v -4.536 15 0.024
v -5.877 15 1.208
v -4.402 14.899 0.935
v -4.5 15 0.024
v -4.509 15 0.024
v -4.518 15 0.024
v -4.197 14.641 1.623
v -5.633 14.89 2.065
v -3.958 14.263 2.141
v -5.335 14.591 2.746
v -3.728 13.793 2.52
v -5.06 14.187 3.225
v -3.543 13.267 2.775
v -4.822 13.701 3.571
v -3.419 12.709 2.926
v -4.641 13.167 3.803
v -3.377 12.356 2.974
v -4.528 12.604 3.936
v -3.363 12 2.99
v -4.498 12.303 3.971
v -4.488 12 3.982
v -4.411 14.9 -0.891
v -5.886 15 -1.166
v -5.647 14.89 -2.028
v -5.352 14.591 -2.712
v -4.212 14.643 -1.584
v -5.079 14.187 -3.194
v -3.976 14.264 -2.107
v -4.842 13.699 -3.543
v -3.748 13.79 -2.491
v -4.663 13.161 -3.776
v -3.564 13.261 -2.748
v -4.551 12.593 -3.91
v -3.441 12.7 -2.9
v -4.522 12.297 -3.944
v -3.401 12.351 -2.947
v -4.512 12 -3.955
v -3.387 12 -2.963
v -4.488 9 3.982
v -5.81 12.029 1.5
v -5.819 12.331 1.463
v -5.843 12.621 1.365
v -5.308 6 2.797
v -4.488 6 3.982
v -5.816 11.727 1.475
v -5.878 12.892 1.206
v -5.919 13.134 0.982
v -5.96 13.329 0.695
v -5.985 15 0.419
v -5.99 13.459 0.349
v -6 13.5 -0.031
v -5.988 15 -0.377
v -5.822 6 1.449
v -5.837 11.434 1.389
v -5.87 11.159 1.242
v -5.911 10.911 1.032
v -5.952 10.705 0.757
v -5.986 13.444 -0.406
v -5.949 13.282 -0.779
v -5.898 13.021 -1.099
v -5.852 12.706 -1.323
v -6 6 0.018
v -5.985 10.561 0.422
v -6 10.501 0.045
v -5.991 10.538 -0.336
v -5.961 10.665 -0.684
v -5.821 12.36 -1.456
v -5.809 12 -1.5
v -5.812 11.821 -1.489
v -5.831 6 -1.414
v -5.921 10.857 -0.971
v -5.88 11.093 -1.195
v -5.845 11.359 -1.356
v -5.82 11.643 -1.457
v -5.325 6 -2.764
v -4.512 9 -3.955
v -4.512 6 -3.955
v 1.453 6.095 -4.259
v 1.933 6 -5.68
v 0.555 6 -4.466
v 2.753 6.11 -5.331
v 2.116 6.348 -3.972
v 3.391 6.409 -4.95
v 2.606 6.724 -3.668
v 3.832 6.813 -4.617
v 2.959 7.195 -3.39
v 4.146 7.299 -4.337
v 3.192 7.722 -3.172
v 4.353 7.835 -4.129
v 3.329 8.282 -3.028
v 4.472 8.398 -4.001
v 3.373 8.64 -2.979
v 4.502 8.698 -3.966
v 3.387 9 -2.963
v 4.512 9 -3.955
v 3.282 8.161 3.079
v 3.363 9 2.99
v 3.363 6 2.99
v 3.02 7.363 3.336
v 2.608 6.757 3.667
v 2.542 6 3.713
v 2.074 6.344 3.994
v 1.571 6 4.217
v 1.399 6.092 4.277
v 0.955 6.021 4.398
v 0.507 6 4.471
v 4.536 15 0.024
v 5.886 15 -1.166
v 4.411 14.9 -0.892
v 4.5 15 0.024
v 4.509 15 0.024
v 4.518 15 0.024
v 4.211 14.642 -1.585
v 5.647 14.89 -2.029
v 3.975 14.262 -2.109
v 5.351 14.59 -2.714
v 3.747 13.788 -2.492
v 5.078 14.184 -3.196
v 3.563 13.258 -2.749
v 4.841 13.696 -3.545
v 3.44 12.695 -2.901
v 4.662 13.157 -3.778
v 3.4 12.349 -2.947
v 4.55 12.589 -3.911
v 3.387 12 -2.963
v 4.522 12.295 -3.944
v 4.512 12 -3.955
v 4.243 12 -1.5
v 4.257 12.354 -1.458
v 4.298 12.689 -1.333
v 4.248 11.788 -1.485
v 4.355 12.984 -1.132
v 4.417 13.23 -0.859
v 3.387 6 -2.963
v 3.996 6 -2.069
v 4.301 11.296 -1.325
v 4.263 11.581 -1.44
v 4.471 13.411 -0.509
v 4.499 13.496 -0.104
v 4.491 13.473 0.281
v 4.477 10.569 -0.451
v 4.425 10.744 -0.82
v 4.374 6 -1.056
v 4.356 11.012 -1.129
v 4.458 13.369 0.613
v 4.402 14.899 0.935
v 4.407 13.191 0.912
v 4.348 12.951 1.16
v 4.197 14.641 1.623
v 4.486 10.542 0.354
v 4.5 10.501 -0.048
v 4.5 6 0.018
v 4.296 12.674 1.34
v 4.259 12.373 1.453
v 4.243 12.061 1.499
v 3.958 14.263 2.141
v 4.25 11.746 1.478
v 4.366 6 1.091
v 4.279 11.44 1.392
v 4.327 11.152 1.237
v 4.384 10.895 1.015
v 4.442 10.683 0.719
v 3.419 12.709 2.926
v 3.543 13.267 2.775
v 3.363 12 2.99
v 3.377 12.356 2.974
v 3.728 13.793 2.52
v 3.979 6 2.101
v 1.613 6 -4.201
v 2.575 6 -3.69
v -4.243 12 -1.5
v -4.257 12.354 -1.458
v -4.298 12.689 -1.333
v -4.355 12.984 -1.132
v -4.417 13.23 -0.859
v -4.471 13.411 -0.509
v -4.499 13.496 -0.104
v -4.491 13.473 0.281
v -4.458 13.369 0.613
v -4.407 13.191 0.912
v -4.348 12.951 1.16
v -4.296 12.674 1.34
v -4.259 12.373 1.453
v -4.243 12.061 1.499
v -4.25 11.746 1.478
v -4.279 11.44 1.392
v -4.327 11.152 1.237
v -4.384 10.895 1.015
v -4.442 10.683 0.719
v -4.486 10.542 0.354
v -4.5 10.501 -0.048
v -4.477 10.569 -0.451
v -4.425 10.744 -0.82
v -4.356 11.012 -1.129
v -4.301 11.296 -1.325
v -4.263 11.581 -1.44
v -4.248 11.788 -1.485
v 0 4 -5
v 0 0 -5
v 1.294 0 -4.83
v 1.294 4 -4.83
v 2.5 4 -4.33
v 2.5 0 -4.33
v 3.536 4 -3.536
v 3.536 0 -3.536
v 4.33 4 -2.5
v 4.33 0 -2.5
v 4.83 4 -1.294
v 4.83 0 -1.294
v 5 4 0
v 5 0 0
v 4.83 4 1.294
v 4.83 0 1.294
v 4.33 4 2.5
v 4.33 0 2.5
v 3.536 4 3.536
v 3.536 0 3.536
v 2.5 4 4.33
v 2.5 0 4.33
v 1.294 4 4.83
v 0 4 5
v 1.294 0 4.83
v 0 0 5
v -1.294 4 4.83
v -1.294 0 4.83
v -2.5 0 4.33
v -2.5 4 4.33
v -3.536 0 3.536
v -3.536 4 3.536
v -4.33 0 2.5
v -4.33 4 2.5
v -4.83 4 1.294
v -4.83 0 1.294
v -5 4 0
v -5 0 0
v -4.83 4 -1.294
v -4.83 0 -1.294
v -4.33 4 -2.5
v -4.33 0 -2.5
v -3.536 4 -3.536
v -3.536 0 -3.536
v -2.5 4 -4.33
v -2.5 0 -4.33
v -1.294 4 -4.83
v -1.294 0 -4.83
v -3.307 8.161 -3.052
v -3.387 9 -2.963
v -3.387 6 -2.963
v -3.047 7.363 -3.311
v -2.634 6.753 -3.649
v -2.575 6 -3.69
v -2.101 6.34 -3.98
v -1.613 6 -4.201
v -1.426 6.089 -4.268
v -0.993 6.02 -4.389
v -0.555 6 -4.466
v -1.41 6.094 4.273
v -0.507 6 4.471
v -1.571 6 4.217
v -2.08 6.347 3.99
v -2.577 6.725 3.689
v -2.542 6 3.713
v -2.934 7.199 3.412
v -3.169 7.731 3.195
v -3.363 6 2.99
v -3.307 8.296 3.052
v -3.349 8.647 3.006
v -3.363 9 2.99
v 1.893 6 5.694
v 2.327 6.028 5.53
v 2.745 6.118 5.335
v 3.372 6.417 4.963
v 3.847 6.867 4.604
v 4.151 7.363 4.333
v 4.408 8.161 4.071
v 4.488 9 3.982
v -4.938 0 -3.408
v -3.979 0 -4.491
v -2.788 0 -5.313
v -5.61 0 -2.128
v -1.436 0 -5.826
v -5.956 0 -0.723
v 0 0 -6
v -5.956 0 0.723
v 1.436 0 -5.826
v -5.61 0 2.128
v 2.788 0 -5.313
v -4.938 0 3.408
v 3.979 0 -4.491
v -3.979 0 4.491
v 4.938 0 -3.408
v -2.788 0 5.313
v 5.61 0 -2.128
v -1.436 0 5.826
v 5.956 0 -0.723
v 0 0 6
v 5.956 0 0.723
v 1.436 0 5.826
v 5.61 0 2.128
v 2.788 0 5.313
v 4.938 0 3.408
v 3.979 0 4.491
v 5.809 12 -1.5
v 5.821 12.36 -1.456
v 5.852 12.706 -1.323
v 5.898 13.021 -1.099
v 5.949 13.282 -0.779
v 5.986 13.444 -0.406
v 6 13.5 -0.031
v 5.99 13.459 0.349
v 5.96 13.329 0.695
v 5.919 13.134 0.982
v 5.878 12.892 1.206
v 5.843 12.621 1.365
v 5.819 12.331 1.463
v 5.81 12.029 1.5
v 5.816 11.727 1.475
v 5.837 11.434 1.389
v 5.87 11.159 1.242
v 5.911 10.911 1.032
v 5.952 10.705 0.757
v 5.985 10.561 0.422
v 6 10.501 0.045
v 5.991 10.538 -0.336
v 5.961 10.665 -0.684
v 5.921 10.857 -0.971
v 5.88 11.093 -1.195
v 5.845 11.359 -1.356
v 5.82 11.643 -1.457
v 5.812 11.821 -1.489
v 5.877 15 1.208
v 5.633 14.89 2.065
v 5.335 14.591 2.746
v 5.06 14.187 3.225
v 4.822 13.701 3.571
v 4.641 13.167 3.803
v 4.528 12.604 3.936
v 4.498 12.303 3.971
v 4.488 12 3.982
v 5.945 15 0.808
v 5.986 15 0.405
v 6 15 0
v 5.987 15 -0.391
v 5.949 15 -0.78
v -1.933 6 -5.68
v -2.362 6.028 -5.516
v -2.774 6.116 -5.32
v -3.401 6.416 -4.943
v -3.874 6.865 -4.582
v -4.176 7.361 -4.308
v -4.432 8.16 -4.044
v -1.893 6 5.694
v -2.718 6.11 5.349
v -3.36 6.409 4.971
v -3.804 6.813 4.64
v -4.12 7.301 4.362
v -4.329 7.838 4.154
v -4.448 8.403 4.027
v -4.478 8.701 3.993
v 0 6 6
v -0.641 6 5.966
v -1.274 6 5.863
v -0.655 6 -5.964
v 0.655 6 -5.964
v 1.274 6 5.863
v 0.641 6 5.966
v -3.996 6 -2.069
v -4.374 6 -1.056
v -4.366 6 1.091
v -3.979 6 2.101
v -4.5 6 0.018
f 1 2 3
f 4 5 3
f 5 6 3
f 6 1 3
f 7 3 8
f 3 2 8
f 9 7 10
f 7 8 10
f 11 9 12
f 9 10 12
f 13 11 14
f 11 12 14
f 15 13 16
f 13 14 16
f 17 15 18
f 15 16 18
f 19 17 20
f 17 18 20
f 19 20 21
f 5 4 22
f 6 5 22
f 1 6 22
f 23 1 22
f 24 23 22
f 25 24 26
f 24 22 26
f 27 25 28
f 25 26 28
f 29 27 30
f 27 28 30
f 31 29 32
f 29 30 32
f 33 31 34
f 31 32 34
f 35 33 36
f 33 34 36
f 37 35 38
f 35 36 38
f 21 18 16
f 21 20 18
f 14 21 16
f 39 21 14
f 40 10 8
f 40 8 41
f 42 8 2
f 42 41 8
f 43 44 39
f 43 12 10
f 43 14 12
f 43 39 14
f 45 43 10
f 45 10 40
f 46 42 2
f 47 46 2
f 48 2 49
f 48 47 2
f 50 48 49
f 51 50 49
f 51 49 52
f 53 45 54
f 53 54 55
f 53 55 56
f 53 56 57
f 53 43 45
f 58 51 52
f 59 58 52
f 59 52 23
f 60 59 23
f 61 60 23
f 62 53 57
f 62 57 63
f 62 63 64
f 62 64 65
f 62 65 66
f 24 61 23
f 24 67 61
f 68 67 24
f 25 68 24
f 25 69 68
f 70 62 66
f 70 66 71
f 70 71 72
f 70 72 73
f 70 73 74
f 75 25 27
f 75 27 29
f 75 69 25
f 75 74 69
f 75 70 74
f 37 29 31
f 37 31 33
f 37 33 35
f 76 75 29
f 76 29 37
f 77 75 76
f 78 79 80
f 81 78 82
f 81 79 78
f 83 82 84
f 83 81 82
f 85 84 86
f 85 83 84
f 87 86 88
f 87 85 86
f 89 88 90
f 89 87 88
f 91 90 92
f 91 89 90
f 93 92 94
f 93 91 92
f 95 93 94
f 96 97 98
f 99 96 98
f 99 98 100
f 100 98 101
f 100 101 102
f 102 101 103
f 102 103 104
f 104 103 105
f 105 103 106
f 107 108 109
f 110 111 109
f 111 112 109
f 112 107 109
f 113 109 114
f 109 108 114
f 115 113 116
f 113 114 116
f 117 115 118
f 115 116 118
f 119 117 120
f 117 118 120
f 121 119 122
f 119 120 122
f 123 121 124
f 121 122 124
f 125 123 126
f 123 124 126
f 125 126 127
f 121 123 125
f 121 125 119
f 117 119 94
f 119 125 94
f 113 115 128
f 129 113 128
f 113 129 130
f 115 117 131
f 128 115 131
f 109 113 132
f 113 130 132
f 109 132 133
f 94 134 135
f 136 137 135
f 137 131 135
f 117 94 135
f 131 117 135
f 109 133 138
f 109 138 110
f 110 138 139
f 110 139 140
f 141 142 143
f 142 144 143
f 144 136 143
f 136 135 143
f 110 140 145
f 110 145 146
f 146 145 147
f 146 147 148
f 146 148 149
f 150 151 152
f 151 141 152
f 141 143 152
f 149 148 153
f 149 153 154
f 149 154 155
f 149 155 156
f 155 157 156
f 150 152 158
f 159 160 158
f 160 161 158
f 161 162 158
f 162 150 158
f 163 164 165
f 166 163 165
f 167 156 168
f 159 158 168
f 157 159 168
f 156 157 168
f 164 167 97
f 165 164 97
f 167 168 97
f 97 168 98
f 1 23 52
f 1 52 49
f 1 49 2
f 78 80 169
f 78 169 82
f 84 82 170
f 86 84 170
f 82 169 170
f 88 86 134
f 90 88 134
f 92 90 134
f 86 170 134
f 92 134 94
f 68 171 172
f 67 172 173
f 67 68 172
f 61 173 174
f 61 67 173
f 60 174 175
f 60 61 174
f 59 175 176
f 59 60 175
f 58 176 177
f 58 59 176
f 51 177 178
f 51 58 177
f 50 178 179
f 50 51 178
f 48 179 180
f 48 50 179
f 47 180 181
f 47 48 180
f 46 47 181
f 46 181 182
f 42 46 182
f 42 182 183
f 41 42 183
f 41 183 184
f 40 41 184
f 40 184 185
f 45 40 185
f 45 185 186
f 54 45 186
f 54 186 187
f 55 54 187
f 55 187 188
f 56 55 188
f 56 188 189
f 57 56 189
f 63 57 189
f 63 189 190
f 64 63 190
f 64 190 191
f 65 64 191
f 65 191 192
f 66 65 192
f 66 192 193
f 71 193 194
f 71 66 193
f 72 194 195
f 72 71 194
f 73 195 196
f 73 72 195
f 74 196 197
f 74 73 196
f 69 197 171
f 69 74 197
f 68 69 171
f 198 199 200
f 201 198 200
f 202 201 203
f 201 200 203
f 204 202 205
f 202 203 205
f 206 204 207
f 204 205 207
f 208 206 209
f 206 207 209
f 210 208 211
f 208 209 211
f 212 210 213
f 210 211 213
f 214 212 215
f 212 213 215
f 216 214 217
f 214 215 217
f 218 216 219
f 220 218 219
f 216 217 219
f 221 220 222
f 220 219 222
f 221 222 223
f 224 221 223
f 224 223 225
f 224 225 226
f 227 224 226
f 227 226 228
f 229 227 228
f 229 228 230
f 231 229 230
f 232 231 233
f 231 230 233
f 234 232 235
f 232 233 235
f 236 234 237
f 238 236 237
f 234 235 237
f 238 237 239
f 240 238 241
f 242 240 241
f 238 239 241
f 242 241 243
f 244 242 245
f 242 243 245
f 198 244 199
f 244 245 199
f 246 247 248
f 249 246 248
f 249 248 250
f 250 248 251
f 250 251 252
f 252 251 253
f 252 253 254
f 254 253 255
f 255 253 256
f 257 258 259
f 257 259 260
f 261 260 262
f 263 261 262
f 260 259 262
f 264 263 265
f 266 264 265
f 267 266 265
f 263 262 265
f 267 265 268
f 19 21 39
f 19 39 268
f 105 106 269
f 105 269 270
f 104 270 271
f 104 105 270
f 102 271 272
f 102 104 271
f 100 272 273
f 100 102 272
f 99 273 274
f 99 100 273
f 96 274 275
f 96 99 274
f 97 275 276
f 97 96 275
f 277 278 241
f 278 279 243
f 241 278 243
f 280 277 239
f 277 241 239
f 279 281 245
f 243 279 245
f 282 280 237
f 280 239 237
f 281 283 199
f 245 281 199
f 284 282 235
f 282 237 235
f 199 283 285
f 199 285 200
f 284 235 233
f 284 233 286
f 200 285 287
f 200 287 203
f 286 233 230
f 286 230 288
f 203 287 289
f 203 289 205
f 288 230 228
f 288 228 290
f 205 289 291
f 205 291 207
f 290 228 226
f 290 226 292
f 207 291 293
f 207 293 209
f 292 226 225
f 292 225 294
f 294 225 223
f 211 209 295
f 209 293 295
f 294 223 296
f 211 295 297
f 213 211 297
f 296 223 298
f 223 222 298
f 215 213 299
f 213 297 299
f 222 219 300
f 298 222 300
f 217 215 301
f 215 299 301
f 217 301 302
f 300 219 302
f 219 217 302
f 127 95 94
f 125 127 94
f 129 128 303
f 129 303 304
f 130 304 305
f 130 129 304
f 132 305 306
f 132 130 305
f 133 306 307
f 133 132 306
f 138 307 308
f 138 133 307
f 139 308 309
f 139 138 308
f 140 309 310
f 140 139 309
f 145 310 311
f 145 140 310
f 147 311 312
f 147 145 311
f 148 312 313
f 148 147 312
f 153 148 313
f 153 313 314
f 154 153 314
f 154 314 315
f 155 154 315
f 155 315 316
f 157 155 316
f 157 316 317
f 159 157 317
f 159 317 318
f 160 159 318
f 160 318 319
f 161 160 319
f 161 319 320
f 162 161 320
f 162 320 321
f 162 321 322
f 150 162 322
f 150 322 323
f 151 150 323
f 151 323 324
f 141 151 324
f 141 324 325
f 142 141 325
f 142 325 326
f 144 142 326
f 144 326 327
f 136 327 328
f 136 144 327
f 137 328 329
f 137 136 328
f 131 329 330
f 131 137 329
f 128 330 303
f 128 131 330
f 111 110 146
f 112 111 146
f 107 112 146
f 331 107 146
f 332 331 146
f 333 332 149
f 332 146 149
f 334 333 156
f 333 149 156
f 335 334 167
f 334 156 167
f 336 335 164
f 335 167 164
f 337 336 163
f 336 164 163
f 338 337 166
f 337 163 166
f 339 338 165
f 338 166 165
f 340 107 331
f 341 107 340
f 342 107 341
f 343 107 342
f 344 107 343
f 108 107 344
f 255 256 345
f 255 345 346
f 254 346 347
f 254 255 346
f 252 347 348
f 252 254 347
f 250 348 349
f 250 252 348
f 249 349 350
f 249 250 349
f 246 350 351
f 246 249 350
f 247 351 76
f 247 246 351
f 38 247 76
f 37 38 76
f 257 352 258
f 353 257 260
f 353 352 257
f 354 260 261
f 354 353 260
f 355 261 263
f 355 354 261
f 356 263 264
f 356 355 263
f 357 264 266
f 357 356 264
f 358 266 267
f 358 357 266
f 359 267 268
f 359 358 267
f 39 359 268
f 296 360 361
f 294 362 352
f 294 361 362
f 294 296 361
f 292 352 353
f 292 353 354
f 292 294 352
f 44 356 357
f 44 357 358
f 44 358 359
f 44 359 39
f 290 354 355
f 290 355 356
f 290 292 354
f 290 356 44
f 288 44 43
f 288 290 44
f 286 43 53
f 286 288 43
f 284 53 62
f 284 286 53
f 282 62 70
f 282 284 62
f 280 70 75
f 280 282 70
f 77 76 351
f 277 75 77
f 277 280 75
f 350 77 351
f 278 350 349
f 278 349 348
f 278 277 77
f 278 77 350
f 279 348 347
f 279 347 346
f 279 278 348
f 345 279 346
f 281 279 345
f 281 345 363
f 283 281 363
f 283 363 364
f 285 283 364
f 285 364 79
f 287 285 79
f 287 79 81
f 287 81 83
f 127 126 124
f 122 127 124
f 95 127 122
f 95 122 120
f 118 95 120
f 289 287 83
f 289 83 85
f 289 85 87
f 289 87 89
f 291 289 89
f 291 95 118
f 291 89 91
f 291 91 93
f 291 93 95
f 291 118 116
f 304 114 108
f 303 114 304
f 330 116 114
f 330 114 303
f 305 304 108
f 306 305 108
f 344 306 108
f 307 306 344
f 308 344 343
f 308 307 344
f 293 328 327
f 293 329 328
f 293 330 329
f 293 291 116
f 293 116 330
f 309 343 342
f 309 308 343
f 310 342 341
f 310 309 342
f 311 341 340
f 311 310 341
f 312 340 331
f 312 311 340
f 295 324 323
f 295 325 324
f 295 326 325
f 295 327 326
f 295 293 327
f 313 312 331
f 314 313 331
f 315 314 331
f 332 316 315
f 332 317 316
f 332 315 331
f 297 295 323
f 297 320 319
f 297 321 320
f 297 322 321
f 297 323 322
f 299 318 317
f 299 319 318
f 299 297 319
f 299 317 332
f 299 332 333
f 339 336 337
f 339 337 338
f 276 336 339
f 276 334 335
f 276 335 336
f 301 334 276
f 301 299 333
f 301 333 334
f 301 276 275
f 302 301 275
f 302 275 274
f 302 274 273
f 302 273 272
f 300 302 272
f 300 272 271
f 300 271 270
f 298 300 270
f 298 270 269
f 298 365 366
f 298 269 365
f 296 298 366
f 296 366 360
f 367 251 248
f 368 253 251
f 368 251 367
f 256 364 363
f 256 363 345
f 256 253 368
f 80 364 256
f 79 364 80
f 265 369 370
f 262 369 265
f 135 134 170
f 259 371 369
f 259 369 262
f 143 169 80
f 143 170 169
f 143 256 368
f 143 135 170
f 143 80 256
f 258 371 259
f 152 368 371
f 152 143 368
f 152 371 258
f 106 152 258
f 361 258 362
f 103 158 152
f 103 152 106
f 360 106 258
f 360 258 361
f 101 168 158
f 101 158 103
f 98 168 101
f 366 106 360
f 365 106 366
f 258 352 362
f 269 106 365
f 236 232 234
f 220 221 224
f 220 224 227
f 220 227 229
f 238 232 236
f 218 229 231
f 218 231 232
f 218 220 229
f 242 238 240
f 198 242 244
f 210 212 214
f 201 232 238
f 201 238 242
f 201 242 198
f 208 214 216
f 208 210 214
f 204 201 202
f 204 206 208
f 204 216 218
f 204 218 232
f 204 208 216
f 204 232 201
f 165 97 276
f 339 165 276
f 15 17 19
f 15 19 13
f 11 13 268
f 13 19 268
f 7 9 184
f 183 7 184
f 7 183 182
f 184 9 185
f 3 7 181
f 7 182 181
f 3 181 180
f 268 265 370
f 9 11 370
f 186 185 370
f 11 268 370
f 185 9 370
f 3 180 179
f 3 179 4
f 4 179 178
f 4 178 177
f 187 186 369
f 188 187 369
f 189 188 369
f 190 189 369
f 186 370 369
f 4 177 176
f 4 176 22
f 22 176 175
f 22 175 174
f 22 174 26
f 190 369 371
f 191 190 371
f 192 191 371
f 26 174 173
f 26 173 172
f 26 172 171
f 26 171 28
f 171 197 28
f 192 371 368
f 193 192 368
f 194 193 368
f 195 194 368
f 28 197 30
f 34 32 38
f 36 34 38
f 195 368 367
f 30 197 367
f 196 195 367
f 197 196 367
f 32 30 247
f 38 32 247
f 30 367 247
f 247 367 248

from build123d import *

# Parameters (mm, degrees)
SKETCH1_R               = 6
BOSS_EXTRUDE1_DEPTH     = 6
BOSS_EXTRUDE2_DEPTH     = 9
FILLET1_R               = 3
FILLET2_R               = 3
CUT_EXTRUDE2_DEPTH      = 18.233688096
CUT_EXTRUDE2_DEPTH_BACK = 18.233688096
SKETCH4_R               = 1.5
SKETCH5_R               = 5
CUT_EXTRUDE3_DEPTH      = 4


with BuildPart() as part:
    # Sketch1 → Boss-Extrude1 (new body)
    with BuildSketch(Plane(origin=(0, 0, 0), x_dir=(1, 0, 0), z_dir=(0, 1, 0))):
        with Locations(Location((0, 0, 0), (0, 0, 270))):
            Circle(SKETCH1_R)
    extrude(amount=BOSS_EXTRUDE1_DEPTH)

    # Sketch3 → Boss-Extrude2 (add)
    with BuildSketch(Plane(origin=(0, 6, 0), x_dir=(1, 0, 0), z_dir=(0, 1, 0))):
        with BuildLine():
            ThreePointArc((-4.512030676, 3.954943638), (-5.999972336, -0.01822004), (-4.487927828, -3.982273699))
            Line((-4.487927828, -3.982273699), (-3.362920912, -2.990110858))
            ThreePointArc((-3.362920912, -2.990110858), (-4.499963114, -0.01822004), (-3.38702376, 2.962780797))
            Line((-3.38702376, 2.962780797), (-4.512030676, 3.954943638))
        make_face()
        with BuildLine():
            Line((3.362920912, -2.990110858), (4.487927828, -3.982273699))
            ThreePointArc((4.487927828, -3.982273699), (5.609258729, -2.129839552), (6, 0))
            ThreePointArc((6, 0), (5.615700493, 2.112796245), (4.512030676, 3.954943638))
            Line((4.512030676, 3.954943638), (3.38702376, 2.962780797))
            ThreePointArc((3.38702376, 2.962780797), (4.499963114, -0.01822004), (3.362920912, -2.990110858))
        make_face()
    extrude(amount=BOSS_EXTRUDE2_DEPTH)

    # Fillet1
    # the kernel refuses this fillet: 3 mm, written as the material it takes off along each edge
    with BuildSketch(Plane(origin=(-2.262079088, 15, -1.970672851), x_dir=(0, -1, 0), z_dir=(0.7499999999999997, 0, 0.661437827766148)), Plane(origin=(10.137030676, 15, -8.915727346), x_dir=(0, -1, 0), z_dir=(-0.7499999999999997, 0, 0.661437827766148)), Plane(origin=(2.23797624, 15, 1.998002911), x_dir=(0, -1, 0), z_dir=(-0.7499999999999997, 0, -0.661437827766148)), Plane(origin=(-10.112927828, 15, 8.943057407), x_dir=(0, -1, 0), z_dir=(0.7499999999999997, 0, -0.661437827766148))) as fillet1_piece_1:
        with BuildLine():
            CenterArc((FILLET1_R, FILLET1_R), FILLET1_R, 180, 90)
            Line((0, FILLET1_R), (0, 0))
            Line((0, 0), (FILLET1_R, 0))
        make_face()
    extrude(amount=16.500009221, mode=Mode.SUBTRACT)

    # Fillet2
    # the kernel refuses this fillet: 3 mm, written as the material it adds along each edge
    with BuildSketch(Plane(origin=(-2.262079088, 6, -1.970672851), x_dir=(-0.661437827766148, 0, 0.7499999999999997), z_dir=(0.7499999999999997, 0, 0.661437827766148))) as fillet2_piece_1_section:
        with BuildLine():
            CenterArc((FILLET2_R, -FILLET2_R), FILLET2_R, 90, 90)
            Line((0, -FILLET2_R), (0, 0))
            Line((0, 0), (FILLET2_R, 0))
        make_face()
    fillet2_piece_1 = extrude(amount=16.500009221, mode=Mode.PRIVATE)
    fillet2_piece_1 = fillet2_piece_1 & Plane(origin=(0, 6.66993204, 0), x_dir=(0, 0, 1), z_dir=(0, -1, 0)) * Cylinder(6, 46, mode=Mode.PRIVATE)
    fillet2_piece_1 = fillet2_piece_1 - Plane(origin=(0, 6.66993204, 0), x_dir=(0.7526719465807102, 0, -0.6583957326945586), z_dir=(0, -1, 0)) * Cylinder(4.5, 46, mode=Mode.PRIVATE)
    add(fillet2_piece_1)
    with BuildSketch(Plane(origin=(10.137030676, 6, -8.915727346), x_dir=(-0.661437827766148, 0, -0.7499999999999998), z_dir=(-0.7499999999999997, 0, 0.661437827766148))) as fillet2_piece_2_section:
        with BuildLine():
            CenterArc((FILLET2_R, -FILLET2_R), FILLET2_R, 90, 90)
            Line((0, -FILLET2_R), (0, 0))
            Line((0, 0), (FILLET2_R, 0))
        make_face()
    fillet2_piece_2 = extrude(amount=16.500009221, mode=Mode.PRIVATE)
    fillet2_piece_2 = fillet2_piece_2 & Plane(origin=(0, 6.67033371, 0), x_dir=(0, 0, 1), z_dir=(0, -1, 0)) * Cylinder(6, 46, mode=Mode.PRIVATE)
    fillet2_piece_2 = fillet2_piece_2 - Plane(origin=(0, 6.67033371, 0), x_dir=(0.7526719465807102, 0, -0.6583957326945586), z_dir=(0, -1, 0)) * Cylinder(4.5, 46, mode=Mode.PRIVATE)
    add(fillet2_piece_2)
    with BuildSketch(Plane(origin=(-10.112927828, 6, 8.943057407), x_dir=(0.661437827766148, 0, 0.7499999999999998), z_dir=(0.7499999999999997, 0, -0.661437827766148))) as fillet2_piece_3_section:
        with BuildLine():
            CenterArc((FILLET2_R, -FILLET2_R), FILLET2_R, 90, 90)
            Line((0, -FILLET2_R), (0, 0))
            Line((0, 0), (FILLET2_R, 0))
        make_face()
    fillet2_piece_3 = extrude(amount=16.500009221, mode=Mode.PRIVATE)
    fillet2_piece_3 = fillet2_piece_3 & Plane(origin=(0, 6.669931793, 0), x_dir=(0, 0, 1), z_dir=(0, -1, 0)) * Cylinder(6, 46, mode=Mode.PRIVATE)
    fillet2_piece_3 = fillet2_piece_3 - Plane(origin=(0, 6.669931793, 0), x_dir=(-0.7473157581885724, 0, 0.6644690794634761), z_dir=(0, -1, 0)) * Cylinder(4.5, 46, mode=Mode.PRIVATE)
    add(fillet2_piece_3)
    with BuildSketch(Plane(origin=(2.23797624, 6, 1.998002911), x_dir=(0.661437827766148, 0, -0.7499999999999997), z_dir=(-0.7499999999999997, 0, -0.661437827766148))) as fillet2_piece_4_section:
        with BuildLine():
            CenterArc((FILLET2_R, -FILLET2_R), FILLET2_R, 90, 90)
            Line((0, -FILLET2_R), (0, 0))
            Line((0, 0), (FILLET2_R, 0))
        make_face()
    fillet2_piece_4 = extrude(amount=16.500009221, mode=Mode.PRIVATE)
    fillet2_piece_4 = fillet2_piece_4 & Plane(origin=(0, 6.670333879, 0), x_dir=(0, 0, 1), z_dir=(0, -1, 0)) * Cylinder(6, 46, mode=Mode.PRIVATE)
    fillet2_piece_4 = fillet2_piece_4 - Plane(origin=(0, 6.670333879, 0), x_dir=(-0.7473157581885724, 0, 0.6644690794634761), z_dir=(0, -1, 0)) * Cylinder(4.5, 46, mode=Mode.PRIVATE)
    add(fillet2_piece_4)

    # Sketch4 → Cut-Extrude2 (cut, two sides: drawn at the far end of the back side and taken through both)
    with BuildSketch(Plane(origin=(0, 0, 0), x_dir=(0, 0, -1), z_dir=(1, 0, 0)).offset(-CUT_EXTRUDE2_DEPTH_BACK)):
        with Locations((0, 12)):
            Circle(SKETCH4_R)
    extrude(amount=CUT_EXTRUDE2_DEPTH + CUT_EXTRUDE2_DEPTH_BACK, mode=Mode.SUBTRACT)

    # Sketch5 → Cut-Extrude3 (cut)
    with BuildSketch(Plane.XZ):
        with Locations(Location((0, 0, 0), (0, 0, 270))):
            Circle(SKETCH5_R)
    extrude(amount=-CUT_EXTRUDE3_DEPTH, mode=Mode.SUBTRACT)


solid = part.part
